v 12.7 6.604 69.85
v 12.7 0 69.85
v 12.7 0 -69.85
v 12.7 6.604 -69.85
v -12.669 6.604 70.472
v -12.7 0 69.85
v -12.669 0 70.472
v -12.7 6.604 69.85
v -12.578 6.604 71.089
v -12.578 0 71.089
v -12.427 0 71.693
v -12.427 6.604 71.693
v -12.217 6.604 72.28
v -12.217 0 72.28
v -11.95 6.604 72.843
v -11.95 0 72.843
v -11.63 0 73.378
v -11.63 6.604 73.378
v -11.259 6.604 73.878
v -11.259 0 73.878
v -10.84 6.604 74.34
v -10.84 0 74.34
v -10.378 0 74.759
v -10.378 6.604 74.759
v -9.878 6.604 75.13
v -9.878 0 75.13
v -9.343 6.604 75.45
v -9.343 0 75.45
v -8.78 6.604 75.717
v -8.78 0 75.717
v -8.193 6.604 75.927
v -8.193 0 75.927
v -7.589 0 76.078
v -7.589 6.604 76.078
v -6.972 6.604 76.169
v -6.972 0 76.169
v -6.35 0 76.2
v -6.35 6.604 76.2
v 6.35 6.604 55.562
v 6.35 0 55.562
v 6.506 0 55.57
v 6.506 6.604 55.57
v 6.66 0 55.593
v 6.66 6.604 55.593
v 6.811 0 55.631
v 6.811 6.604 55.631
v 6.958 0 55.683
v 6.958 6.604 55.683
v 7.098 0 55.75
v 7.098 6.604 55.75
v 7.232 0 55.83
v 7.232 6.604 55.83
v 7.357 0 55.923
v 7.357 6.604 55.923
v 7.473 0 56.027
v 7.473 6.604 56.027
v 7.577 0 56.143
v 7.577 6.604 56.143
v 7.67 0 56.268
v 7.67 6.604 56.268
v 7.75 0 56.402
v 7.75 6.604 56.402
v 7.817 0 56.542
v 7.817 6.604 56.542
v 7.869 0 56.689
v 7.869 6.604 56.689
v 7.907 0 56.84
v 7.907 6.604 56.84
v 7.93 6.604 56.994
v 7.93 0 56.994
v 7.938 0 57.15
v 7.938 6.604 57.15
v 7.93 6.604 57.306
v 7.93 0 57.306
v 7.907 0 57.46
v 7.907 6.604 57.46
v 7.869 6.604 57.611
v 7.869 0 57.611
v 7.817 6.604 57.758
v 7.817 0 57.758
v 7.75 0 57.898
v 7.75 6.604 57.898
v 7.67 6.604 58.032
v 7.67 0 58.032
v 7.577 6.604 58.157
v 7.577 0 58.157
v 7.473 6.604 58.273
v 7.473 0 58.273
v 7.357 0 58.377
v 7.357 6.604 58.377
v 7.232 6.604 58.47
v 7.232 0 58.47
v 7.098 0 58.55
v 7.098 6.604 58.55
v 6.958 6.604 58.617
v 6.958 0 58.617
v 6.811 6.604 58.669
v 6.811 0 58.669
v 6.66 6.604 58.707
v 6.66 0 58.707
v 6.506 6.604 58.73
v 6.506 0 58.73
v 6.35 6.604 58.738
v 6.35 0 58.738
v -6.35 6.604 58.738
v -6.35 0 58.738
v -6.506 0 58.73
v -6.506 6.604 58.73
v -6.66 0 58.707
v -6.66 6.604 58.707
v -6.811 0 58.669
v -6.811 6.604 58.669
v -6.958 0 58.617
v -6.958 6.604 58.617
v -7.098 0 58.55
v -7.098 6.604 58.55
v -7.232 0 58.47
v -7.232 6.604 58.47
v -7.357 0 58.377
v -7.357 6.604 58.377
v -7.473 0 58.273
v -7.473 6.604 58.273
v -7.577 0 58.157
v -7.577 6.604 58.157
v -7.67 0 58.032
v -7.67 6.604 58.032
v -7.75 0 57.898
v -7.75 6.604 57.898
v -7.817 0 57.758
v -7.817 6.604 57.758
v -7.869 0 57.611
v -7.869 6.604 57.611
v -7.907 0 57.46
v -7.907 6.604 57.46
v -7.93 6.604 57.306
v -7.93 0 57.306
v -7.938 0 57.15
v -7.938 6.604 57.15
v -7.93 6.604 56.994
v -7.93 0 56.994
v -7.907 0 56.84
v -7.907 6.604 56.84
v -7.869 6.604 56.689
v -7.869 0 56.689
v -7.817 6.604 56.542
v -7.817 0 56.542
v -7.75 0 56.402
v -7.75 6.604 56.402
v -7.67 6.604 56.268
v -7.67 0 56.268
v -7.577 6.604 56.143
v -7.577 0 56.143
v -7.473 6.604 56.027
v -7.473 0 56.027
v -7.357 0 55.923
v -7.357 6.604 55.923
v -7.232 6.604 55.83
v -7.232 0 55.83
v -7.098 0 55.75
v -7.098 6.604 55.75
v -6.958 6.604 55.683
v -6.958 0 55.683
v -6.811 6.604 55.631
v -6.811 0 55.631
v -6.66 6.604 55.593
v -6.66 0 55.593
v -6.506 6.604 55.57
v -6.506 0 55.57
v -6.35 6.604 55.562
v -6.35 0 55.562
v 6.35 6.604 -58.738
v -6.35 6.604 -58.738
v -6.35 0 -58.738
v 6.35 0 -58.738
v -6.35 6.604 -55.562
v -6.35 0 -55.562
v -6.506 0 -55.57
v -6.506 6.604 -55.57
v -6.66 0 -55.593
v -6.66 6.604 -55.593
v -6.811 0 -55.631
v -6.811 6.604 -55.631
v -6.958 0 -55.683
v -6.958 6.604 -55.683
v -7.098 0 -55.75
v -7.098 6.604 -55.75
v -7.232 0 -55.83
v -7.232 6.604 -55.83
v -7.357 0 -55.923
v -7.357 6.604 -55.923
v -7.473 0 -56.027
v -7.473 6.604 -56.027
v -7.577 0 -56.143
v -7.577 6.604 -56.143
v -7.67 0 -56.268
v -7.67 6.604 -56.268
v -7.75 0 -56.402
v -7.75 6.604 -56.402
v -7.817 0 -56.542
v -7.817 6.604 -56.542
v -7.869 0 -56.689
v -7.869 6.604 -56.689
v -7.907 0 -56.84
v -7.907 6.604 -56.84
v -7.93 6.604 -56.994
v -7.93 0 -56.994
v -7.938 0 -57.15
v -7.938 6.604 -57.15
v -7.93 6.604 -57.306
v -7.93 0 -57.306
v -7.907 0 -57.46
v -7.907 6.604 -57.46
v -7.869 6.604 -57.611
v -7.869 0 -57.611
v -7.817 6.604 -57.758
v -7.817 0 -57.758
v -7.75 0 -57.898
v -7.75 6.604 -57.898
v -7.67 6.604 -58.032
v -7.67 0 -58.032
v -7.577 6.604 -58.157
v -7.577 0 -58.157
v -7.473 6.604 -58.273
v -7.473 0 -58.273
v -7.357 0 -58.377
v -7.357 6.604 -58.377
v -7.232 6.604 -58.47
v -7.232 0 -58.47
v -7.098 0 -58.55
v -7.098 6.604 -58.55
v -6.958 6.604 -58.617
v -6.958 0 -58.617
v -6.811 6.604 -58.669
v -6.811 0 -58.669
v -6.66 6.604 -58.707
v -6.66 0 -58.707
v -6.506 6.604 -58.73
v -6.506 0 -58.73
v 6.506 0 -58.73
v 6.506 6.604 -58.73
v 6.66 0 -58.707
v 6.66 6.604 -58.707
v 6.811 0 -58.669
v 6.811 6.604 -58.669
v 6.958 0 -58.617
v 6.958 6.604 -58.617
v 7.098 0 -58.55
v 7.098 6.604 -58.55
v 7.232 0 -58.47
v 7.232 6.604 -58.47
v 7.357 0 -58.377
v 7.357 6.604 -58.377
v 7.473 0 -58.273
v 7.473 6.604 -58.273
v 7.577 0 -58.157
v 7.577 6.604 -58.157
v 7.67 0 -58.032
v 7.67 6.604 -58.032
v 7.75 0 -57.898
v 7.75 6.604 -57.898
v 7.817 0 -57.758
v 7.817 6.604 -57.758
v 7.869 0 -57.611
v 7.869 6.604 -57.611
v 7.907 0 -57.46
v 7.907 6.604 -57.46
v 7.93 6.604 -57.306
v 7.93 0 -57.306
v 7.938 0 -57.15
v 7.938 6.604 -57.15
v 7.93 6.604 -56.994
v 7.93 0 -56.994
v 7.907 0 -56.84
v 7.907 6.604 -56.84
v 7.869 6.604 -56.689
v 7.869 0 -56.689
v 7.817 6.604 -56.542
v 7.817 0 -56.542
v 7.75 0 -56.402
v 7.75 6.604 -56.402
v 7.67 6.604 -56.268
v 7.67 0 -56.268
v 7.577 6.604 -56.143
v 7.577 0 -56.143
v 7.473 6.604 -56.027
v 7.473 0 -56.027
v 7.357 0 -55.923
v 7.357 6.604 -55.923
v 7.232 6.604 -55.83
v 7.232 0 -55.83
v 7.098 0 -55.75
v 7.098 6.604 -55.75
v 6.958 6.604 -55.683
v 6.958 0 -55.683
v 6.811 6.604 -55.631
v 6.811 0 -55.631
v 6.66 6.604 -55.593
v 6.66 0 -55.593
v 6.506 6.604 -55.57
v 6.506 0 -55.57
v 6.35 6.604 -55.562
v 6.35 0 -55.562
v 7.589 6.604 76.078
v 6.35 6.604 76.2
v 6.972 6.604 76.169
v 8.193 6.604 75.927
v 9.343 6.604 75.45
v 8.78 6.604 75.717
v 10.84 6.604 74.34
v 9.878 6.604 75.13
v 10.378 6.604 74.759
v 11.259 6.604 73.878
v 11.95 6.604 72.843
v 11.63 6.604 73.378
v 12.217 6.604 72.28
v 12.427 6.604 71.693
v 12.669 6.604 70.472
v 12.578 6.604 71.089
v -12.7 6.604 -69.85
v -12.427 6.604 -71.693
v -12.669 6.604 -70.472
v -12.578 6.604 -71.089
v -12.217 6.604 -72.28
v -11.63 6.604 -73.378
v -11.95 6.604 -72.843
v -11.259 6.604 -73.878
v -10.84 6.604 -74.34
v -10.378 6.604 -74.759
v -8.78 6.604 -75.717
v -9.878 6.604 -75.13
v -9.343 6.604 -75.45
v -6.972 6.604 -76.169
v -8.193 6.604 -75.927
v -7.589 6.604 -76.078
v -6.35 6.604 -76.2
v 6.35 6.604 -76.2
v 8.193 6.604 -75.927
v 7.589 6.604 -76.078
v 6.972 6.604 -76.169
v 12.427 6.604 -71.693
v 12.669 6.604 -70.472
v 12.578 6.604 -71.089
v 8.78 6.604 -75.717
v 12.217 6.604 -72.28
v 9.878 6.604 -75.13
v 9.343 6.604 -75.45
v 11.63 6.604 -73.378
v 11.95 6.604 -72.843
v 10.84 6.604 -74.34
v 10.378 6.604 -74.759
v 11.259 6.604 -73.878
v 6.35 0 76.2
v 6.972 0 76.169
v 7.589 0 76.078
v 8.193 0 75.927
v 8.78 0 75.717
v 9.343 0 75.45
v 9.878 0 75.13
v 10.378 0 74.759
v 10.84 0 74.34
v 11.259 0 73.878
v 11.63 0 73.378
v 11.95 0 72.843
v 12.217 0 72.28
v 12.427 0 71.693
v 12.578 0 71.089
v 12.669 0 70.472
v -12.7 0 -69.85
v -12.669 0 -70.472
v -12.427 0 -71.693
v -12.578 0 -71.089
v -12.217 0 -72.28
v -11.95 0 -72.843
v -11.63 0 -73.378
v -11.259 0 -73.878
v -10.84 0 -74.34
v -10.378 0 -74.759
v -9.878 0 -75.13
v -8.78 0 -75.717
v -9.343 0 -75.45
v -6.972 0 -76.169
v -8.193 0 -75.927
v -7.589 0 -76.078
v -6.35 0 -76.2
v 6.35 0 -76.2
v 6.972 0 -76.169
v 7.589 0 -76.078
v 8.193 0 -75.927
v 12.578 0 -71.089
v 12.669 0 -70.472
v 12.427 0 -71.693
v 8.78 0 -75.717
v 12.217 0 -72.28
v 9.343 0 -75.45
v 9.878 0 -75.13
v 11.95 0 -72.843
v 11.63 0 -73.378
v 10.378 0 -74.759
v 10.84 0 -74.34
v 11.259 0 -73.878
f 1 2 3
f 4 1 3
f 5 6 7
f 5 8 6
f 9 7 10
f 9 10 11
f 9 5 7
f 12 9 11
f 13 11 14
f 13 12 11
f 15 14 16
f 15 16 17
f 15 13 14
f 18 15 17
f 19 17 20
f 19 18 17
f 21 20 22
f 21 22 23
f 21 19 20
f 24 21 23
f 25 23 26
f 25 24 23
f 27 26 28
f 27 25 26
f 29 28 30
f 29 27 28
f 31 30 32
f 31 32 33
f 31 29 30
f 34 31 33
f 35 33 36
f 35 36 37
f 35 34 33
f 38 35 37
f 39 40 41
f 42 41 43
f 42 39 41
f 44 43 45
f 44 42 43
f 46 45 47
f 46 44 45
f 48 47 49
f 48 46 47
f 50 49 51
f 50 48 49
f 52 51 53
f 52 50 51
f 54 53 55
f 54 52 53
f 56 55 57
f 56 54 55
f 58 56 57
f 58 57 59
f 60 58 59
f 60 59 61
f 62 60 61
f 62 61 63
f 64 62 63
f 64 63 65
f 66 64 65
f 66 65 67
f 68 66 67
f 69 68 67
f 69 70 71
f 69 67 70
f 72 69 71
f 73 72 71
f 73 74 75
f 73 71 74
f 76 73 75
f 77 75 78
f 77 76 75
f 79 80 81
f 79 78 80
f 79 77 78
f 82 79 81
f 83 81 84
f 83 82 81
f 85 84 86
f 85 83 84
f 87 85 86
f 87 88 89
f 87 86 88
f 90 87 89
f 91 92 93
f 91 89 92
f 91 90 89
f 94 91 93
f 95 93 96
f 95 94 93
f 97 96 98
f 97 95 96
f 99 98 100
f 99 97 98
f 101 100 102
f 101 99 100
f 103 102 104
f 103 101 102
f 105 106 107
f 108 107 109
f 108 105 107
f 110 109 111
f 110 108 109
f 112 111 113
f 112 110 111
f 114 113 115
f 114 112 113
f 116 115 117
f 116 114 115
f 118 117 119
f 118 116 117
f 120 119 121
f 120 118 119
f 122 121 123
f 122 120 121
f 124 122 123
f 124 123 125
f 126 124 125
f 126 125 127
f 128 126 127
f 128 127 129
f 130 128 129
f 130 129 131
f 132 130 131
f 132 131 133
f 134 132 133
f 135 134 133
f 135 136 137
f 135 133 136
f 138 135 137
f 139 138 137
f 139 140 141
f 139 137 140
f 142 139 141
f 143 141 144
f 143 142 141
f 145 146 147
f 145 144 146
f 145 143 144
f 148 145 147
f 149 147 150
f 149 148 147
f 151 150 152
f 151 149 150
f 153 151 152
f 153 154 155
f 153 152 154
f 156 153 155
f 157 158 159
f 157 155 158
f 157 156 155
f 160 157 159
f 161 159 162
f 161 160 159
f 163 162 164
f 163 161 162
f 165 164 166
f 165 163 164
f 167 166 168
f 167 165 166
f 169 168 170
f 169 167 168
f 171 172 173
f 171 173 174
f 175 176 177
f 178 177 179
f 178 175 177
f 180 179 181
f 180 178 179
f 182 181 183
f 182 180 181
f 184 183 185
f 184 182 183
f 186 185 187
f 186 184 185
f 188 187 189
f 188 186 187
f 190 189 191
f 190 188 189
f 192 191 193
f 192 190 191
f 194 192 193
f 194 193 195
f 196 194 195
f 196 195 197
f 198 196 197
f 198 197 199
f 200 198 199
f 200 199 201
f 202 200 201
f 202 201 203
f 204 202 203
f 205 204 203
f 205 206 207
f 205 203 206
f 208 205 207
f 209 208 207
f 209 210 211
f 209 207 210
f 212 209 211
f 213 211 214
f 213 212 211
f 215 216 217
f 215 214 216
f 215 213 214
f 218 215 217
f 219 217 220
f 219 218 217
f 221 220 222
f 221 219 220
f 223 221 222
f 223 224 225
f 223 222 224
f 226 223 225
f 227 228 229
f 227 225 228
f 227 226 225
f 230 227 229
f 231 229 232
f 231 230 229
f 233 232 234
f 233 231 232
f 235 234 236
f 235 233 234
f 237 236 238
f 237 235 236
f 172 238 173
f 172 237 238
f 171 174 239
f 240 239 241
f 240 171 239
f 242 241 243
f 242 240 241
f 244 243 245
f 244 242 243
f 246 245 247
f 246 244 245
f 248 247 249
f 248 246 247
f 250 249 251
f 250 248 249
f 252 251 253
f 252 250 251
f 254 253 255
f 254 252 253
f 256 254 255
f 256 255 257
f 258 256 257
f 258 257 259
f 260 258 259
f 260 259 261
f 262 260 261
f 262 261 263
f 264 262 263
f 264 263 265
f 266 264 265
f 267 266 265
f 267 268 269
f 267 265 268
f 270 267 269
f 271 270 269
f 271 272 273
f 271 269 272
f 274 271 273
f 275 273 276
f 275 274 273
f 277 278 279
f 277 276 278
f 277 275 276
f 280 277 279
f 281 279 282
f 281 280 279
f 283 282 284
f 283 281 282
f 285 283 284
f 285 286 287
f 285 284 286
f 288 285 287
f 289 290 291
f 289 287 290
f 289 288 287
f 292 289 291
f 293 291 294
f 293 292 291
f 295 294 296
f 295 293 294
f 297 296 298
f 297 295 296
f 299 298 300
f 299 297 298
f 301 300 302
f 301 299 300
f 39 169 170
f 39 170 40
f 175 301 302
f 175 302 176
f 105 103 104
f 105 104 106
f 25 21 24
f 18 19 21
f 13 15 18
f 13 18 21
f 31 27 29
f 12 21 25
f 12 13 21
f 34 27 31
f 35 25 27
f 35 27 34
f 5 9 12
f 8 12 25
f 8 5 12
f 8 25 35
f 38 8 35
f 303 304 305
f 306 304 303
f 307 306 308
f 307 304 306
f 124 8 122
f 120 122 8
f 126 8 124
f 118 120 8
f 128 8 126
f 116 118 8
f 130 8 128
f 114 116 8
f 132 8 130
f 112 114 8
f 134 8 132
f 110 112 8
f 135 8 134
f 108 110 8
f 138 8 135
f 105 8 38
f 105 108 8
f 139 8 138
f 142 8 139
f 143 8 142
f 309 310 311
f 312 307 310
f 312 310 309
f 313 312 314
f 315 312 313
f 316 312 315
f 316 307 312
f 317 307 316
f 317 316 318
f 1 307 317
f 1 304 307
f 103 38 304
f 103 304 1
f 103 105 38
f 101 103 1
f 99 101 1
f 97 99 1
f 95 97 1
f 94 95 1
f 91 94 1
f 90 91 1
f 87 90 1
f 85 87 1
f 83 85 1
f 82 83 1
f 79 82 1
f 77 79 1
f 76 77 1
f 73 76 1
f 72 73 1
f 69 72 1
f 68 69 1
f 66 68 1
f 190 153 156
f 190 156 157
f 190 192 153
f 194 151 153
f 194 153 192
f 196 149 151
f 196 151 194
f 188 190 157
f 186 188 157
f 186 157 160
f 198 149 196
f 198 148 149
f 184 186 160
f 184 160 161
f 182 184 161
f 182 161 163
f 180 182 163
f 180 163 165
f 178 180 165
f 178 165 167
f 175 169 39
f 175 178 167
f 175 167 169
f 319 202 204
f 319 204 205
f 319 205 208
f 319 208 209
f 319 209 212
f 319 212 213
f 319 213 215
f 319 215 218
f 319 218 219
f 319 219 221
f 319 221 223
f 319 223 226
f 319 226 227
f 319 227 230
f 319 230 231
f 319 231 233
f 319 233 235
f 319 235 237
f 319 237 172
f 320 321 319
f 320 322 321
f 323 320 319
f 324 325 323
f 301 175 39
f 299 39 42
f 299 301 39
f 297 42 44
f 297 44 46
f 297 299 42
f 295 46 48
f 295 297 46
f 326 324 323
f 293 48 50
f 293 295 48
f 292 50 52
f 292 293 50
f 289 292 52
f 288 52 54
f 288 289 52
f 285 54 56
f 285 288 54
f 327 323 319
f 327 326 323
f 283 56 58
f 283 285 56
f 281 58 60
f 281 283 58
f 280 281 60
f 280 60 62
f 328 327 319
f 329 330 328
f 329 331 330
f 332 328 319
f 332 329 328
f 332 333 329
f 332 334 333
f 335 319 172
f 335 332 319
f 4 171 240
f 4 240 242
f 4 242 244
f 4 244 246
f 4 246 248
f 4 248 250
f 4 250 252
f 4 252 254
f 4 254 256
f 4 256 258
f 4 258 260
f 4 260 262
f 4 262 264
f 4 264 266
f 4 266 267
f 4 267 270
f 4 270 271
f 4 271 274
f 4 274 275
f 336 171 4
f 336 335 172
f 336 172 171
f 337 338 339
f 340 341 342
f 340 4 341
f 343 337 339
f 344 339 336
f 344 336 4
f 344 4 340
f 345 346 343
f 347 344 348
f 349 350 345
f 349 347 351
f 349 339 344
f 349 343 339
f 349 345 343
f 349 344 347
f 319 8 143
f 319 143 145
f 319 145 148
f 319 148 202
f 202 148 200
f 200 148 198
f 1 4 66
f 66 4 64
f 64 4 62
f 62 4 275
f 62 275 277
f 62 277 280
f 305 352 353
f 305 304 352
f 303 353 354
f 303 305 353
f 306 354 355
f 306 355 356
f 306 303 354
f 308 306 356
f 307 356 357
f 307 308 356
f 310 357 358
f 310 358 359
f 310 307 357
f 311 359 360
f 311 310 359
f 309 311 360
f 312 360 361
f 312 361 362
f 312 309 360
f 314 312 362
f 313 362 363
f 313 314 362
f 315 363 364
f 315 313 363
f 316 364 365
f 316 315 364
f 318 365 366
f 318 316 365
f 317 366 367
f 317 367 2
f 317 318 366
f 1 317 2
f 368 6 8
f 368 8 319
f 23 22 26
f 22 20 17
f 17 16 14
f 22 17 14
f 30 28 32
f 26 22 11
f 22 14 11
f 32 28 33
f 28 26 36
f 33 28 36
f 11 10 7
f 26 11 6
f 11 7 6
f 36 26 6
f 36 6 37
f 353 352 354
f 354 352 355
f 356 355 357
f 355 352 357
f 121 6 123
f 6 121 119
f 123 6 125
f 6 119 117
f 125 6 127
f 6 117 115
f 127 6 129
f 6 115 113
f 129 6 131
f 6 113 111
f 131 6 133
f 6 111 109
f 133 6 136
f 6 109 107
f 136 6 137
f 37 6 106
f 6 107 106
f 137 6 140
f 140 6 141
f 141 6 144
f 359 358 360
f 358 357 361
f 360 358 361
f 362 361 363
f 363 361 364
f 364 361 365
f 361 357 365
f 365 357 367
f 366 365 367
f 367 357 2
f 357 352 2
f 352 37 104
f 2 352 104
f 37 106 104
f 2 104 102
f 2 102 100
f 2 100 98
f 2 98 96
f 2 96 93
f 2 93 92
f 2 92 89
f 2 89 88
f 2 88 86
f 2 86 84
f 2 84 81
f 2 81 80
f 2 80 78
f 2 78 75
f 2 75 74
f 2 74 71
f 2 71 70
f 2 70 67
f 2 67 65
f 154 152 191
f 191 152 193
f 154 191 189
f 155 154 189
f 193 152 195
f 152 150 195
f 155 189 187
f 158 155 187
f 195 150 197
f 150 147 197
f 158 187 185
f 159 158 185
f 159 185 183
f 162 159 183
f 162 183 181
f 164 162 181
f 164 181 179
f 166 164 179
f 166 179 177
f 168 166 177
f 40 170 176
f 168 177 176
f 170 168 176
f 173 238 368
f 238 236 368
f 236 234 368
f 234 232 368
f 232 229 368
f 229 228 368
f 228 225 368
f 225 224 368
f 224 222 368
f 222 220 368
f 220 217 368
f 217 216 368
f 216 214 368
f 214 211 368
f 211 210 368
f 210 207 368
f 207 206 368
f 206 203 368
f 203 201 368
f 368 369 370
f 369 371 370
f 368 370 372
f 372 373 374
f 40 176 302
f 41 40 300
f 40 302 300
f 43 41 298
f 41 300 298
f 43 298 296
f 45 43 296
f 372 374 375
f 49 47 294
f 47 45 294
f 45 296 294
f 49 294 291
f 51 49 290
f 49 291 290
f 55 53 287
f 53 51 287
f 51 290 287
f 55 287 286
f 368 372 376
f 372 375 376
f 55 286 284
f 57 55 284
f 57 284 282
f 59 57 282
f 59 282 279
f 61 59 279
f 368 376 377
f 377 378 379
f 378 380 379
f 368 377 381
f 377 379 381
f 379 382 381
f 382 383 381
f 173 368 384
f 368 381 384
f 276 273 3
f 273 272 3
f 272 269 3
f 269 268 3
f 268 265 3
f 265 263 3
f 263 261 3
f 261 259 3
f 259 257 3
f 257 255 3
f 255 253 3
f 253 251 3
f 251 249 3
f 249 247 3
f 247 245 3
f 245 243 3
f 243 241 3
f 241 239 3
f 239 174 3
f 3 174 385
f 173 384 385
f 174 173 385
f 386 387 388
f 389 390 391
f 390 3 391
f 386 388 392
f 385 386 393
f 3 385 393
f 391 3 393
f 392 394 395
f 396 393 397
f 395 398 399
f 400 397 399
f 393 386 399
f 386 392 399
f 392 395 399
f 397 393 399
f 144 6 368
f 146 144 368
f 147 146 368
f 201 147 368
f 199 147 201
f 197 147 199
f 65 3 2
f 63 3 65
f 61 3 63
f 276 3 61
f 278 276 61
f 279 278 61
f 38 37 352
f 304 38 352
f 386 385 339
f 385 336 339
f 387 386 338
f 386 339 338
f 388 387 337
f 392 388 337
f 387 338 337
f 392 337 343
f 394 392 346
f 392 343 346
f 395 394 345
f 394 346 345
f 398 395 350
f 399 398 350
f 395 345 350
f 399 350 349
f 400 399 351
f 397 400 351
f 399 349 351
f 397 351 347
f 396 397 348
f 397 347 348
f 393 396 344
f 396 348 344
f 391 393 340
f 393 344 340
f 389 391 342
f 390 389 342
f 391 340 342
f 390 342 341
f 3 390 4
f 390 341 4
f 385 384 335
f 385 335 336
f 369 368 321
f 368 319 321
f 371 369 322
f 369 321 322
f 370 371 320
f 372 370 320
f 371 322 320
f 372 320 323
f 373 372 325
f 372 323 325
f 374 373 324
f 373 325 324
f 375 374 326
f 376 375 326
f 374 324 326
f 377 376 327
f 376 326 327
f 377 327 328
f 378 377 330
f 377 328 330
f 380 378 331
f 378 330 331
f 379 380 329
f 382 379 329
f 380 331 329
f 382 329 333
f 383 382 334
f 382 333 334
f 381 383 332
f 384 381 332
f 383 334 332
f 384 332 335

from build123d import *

# Parameters (mm, degrees)
SKETCH1_W           = 25.4
SKETCH1_H           = 152.4
BOSS_EXTRUDE1_DEPTH = 6.604
CUT_EXTRUDE1_DEPTH  = 7.604
FILLET1_R           = 6.35


with BuildPart() as part:
    # Sketch1 → Boss-Extrude1 (new body)
    with BuildSketch(Plane(origin=(0, 0, 0), x_dir=(1, 0, 0), z_dir=(0, 1, 0))):
        Rectangle(SKETCH1_W, SKETCH1_H)
    extrude(amount=BOSS_EXTRUDE1_DEPTH)

    # Sketch2 → Cut-Extrude1 (cut, through all)
    with BuildSketch(Plane(origin=(0, 6.604, 0), x_dir=(1, 0, 0), z_dir=(0, 1, 0))):
        with BuildLine():
            Line((-6.35, 58.7375), (6.35, 58.7375))
            ThreePointArc((6.35, 58.7375), (7.9375, 57.15), (6.35, 55.5625))
            Line((6.35, 55.5625), (-6.35, 55.5625))
            ThreePointArc((-6.35, 55.5625), (-7.9375, 57.15), (-6.35, 58.7375))
        make_face()
        with BuildLine():
            Line((-6.35, -55.5625), (6.35, -55.5625))
            ThreePointArc((6.35, -55.5625), (7.9375, -57.15), (6.35, -58.7375))
            Line((6.35, -58.7375), (-6.35, -58.7375))
            ThreePointArc((-6.35, -58.7375), (-7.9375, -57.15), (-6.35, -55.5625))
        make_face()
    extrude(amount=-CUT_EXTRUDE1_DEPTH, mode=Mode.SUBTRACT)

    # Fillet1
    fillet1_edges = [part.edges().sort_by_distance(p)[0] for p in [
        (-12.7, 3.302, -76.2),
        (12.7, 3.302, -76.2),
        (12.7, 3.302, 76.2),
        (-12.7, 3.302, 76.2),
    ]]
    fillet(fillet1_edges, radius=FILLET1_R)


solid = part.part
